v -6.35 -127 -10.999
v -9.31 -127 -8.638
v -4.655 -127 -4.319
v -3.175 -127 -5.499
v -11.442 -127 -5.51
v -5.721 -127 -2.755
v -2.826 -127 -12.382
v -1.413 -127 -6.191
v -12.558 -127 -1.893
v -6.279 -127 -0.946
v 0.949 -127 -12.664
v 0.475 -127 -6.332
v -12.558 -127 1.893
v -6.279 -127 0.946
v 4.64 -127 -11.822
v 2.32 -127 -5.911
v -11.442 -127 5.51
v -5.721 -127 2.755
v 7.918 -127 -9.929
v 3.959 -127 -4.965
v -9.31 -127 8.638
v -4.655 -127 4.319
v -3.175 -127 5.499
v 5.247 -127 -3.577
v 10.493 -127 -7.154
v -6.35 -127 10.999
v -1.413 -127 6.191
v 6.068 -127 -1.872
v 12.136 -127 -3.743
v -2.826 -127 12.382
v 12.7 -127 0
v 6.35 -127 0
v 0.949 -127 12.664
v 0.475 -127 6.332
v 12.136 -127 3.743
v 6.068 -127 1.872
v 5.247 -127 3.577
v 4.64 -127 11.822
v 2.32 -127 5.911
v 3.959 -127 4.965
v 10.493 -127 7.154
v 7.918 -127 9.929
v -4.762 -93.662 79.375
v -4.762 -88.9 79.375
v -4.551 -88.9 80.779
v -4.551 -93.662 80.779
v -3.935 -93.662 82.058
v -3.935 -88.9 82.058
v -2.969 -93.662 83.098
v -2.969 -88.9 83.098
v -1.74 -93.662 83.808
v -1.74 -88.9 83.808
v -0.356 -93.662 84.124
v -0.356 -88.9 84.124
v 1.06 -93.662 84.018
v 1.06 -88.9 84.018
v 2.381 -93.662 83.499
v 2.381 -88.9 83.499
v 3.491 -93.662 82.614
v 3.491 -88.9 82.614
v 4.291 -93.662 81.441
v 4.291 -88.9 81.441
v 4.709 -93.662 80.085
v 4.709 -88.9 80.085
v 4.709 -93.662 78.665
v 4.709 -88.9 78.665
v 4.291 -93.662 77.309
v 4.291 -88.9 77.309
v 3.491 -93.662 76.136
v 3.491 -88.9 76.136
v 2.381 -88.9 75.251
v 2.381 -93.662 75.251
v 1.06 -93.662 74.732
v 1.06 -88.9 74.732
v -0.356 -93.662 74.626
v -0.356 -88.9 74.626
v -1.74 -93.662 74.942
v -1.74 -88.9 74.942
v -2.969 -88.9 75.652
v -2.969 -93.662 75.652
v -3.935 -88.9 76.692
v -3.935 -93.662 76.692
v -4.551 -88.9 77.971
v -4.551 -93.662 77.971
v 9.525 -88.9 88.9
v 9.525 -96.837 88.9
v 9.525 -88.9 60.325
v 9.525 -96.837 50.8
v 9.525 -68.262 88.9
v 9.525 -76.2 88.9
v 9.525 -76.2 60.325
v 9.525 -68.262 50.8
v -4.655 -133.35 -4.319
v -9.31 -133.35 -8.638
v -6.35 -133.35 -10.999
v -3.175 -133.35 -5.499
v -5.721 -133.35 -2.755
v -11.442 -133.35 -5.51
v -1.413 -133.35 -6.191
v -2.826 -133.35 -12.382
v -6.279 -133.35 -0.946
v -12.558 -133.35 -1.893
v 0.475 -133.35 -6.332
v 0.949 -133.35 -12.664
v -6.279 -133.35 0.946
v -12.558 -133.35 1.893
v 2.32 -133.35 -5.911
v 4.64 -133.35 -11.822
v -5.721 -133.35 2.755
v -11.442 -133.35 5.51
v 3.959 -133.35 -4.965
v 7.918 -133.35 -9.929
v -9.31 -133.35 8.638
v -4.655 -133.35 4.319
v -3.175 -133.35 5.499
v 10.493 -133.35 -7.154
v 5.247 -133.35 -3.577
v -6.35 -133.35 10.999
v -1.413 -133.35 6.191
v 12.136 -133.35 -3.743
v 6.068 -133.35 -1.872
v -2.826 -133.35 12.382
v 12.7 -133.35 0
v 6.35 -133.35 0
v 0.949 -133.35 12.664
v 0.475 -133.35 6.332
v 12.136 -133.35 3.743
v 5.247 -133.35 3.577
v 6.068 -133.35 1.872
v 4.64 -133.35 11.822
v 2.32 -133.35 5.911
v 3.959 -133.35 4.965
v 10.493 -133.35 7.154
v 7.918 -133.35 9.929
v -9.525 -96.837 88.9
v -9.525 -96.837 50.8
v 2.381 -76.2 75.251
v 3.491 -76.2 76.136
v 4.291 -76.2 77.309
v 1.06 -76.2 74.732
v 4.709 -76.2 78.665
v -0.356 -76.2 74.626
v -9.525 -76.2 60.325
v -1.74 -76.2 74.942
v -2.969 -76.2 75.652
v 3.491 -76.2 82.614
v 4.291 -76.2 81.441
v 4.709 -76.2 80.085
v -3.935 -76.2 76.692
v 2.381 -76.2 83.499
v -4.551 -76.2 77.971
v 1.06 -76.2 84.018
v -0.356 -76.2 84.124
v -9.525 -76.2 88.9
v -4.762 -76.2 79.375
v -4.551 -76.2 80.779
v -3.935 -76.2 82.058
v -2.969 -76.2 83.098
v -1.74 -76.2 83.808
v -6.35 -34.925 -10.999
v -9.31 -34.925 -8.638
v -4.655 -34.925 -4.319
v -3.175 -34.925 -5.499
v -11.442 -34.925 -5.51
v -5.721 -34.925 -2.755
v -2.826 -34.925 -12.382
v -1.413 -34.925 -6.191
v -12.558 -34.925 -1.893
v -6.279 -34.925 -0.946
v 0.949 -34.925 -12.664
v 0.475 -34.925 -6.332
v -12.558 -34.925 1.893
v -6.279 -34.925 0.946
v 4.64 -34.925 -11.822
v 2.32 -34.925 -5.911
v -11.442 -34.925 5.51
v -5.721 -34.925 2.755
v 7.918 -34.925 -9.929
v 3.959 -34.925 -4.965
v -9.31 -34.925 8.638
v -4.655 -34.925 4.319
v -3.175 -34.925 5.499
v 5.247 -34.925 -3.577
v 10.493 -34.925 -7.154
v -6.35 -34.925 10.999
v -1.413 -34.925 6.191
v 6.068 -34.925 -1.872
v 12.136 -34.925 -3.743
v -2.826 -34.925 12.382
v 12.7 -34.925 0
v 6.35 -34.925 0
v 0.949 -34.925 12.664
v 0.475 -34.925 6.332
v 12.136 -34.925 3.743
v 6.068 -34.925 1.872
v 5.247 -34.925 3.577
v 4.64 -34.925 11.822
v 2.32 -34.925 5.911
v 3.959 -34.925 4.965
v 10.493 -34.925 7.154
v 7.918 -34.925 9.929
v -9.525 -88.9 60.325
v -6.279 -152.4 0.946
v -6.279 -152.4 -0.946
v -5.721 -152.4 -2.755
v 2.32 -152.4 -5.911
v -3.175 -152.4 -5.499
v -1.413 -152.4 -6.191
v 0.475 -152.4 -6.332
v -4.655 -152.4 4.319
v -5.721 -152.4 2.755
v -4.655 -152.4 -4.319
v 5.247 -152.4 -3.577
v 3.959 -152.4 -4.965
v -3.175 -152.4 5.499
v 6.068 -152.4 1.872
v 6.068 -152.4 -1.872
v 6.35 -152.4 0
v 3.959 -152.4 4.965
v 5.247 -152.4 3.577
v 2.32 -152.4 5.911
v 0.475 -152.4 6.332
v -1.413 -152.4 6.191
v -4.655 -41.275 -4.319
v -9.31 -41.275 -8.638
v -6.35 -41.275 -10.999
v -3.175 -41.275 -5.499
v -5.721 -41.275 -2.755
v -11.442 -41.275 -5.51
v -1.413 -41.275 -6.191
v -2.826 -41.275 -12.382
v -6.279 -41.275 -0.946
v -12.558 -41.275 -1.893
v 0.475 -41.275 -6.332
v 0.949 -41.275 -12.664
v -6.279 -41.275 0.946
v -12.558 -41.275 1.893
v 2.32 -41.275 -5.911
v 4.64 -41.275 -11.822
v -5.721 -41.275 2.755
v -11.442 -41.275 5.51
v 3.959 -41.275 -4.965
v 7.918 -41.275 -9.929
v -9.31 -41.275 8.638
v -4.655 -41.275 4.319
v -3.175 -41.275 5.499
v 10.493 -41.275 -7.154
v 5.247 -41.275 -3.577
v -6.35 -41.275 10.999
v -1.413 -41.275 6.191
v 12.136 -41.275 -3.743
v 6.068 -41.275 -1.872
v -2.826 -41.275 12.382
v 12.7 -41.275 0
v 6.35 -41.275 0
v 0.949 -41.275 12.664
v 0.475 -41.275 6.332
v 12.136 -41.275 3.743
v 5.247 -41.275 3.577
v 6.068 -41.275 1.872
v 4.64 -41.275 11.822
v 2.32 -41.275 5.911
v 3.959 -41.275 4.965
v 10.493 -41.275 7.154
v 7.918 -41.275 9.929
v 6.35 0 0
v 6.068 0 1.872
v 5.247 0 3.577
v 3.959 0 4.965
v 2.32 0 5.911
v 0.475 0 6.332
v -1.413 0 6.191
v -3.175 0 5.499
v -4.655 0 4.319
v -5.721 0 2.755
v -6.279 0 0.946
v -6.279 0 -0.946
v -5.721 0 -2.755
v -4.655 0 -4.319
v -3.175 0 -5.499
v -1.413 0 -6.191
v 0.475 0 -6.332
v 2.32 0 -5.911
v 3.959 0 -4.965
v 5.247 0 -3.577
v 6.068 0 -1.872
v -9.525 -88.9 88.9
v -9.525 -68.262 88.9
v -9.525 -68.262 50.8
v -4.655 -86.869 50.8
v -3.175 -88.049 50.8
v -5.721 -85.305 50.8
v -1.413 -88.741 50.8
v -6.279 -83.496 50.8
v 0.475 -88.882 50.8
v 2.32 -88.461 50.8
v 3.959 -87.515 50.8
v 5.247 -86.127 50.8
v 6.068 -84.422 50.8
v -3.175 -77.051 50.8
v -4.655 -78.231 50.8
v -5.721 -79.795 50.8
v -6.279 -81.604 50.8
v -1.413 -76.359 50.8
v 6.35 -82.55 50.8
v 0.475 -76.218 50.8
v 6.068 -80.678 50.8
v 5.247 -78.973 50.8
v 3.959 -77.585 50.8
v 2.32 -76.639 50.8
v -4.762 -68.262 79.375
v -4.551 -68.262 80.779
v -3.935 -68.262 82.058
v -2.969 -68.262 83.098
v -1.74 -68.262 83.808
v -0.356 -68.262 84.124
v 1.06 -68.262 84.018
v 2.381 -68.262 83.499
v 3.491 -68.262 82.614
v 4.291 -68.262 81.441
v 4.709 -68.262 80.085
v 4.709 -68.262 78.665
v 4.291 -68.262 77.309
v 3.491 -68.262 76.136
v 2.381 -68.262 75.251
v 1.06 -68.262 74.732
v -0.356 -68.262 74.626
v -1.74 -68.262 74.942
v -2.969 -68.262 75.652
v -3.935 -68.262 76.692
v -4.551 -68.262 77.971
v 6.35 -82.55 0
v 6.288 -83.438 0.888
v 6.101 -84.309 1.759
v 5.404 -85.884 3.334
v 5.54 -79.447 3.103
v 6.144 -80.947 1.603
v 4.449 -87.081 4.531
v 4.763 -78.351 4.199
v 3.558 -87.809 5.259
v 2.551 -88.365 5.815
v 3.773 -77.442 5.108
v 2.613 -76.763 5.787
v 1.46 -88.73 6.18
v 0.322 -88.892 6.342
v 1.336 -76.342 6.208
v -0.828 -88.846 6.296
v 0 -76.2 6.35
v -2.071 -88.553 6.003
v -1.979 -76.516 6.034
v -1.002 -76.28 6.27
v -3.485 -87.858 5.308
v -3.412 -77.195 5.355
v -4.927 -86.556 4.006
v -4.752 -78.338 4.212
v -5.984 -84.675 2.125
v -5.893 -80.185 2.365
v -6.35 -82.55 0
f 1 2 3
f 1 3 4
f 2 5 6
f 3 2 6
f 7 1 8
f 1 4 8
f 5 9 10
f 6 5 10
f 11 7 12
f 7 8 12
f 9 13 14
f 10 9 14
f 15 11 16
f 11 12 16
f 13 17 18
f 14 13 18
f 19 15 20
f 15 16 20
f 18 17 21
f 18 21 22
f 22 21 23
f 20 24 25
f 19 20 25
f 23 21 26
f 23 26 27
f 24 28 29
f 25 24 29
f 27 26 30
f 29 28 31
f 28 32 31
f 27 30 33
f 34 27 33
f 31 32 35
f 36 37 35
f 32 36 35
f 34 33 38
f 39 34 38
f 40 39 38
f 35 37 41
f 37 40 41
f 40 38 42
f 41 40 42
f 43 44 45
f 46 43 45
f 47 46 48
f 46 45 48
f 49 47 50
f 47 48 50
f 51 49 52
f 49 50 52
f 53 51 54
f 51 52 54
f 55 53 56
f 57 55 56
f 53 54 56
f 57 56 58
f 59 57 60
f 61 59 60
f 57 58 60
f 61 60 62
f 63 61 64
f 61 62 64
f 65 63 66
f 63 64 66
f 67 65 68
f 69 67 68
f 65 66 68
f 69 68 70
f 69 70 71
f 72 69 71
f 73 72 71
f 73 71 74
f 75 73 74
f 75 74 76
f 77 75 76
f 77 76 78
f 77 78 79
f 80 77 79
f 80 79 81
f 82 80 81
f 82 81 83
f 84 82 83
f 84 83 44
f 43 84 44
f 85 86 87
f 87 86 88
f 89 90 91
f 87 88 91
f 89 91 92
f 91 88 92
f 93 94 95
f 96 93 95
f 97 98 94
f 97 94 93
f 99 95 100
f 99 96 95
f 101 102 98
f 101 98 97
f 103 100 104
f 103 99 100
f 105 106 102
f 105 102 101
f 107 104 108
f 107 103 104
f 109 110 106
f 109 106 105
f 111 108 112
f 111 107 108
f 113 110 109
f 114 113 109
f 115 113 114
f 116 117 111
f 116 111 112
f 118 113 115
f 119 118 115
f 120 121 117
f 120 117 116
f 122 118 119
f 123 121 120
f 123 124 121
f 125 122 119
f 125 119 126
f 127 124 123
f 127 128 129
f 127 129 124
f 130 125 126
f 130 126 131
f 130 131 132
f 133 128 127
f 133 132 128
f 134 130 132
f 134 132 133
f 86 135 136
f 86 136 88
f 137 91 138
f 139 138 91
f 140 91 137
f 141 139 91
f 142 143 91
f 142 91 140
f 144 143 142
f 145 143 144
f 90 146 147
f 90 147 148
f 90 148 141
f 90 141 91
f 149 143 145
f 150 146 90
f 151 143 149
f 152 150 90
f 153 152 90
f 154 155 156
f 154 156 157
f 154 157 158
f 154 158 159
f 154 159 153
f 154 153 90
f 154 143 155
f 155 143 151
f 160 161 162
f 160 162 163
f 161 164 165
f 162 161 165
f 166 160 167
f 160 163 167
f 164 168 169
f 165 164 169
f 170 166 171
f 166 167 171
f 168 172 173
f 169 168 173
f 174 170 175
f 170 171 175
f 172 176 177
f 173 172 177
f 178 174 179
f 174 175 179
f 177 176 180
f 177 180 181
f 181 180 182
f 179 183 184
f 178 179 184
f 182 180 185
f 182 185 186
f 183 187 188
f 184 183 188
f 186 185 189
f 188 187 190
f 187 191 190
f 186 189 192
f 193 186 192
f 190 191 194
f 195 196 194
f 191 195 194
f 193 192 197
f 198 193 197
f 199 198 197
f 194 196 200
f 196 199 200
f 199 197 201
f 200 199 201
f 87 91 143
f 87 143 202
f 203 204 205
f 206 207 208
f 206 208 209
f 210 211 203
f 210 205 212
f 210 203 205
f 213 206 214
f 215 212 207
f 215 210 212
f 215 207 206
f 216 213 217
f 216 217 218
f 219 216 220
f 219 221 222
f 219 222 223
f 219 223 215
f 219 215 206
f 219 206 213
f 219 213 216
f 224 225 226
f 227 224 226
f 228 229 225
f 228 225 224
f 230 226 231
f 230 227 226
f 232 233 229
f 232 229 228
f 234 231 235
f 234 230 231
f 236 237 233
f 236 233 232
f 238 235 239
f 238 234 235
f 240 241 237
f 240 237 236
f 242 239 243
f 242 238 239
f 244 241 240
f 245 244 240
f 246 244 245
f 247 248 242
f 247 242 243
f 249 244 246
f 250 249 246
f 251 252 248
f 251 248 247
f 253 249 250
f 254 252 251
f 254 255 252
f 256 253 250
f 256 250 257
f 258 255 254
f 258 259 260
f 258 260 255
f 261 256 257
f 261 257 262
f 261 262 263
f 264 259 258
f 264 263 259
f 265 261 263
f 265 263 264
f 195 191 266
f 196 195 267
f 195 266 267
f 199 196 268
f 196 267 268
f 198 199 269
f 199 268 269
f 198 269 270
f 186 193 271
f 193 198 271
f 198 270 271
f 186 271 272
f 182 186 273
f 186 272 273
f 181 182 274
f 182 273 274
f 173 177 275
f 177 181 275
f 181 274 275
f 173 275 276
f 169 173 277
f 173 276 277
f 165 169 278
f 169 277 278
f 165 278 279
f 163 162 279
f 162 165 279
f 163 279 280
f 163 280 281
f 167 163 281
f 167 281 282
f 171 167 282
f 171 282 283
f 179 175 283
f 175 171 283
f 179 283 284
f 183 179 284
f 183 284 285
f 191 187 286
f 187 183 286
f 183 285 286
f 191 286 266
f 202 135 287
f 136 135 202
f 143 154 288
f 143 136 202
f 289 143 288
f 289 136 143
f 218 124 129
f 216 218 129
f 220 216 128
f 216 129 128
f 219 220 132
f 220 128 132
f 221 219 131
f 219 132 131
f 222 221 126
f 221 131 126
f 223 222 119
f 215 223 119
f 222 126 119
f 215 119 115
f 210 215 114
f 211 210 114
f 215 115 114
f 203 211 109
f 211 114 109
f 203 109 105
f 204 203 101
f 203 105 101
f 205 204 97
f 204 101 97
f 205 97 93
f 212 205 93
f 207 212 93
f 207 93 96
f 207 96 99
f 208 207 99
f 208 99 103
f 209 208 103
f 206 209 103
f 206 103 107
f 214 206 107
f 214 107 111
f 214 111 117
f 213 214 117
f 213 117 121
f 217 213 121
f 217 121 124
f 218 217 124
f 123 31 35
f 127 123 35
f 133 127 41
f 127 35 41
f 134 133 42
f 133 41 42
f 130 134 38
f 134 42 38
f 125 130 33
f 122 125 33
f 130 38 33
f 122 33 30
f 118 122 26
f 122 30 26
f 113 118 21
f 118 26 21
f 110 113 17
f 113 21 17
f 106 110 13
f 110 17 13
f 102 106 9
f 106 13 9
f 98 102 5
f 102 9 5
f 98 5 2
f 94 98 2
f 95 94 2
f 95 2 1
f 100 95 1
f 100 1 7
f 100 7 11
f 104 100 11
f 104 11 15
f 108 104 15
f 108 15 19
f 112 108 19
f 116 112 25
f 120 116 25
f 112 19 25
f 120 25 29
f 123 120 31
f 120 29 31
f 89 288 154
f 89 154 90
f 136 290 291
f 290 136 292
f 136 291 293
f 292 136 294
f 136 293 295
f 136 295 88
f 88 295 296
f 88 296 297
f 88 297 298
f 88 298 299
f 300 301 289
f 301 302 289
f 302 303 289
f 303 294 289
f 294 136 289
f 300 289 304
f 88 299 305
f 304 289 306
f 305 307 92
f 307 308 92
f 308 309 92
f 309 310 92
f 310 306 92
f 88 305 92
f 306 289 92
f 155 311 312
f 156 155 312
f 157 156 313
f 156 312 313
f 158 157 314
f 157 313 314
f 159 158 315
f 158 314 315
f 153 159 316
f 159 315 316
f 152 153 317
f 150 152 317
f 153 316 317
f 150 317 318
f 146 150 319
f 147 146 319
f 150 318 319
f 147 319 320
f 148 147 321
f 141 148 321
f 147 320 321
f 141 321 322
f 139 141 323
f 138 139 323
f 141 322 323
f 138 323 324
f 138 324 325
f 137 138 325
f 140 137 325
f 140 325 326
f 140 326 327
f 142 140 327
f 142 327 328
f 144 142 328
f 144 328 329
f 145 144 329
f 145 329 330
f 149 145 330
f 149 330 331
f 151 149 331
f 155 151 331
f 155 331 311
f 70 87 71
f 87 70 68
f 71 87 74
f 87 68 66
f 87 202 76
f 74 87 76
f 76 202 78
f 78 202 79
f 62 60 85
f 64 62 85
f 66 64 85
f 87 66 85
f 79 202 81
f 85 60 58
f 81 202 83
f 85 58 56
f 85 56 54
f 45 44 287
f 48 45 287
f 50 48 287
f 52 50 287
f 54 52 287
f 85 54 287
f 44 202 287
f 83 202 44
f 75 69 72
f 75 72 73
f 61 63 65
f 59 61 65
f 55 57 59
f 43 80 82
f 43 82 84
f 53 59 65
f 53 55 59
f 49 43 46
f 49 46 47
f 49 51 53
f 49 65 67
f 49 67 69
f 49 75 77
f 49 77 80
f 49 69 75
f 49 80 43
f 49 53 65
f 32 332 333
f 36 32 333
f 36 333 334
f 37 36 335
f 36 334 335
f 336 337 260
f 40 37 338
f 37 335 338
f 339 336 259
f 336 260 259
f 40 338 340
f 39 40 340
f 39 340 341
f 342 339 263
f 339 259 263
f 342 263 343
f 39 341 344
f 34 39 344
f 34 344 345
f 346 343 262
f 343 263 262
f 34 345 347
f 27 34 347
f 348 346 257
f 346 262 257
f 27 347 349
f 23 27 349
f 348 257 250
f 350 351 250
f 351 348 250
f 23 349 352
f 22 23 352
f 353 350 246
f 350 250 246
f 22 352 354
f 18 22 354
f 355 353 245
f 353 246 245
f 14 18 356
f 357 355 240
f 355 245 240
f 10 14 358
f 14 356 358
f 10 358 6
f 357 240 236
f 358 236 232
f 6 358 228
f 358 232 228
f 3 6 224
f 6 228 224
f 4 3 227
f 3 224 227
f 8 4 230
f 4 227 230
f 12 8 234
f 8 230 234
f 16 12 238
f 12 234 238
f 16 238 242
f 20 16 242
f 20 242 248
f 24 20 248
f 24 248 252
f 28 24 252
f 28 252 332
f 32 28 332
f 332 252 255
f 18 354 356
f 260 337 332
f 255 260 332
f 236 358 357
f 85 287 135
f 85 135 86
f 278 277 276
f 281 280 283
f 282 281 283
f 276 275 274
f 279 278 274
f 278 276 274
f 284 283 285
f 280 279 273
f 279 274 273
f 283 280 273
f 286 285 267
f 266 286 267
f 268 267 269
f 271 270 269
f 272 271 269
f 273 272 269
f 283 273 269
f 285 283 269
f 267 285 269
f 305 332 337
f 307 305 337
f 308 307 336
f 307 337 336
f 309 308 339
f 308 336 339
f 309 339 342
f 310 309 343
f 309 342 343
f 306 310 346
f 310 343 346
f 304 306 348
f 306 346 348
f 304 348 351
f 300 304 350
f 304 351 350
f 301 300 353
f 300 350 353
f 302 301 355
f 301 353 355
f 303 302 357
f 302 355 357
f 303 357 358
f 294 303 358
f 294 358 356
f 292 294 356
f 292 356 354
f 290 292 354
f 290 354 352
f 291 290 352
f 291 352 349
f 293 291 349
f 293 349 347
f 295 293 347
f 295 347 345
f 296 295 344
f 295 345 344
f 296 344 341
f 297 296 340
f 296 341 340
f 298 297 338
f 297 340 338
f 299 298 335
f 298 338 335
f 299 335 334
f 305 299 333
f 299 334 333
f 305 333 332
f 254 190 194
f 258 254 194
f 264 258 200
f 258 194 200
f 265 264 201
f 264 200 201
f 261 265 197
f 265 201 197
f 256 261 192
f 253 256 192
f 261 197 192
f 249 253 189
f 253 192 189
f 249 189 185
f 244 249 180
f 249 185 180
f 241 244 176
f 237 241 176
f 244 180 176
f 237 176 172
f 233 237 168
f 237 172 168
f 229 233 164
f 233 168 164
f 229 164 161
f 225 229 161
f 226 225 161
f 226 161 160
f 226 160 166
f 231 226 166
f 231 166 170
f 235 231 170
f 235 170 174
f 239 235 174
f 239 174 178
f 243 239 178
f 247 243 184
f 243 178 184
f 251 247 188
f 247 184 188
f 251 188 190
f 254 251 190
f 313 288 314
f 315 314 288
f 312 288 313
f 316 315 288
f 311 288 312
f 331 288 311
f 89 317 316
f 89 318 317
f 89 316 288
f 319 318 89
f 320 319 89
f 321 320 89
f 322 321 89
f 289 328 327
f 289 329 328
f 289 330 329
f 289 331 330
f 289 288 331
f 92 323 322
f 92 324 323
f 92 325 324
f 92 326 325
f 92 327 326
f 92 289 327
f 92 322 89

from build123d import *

# Parameters (mm, degrees)
F0_R      = 6.35
F1_DEPTH  = 152.4
F4_R      = 12.7
F5_DEPTH  = 6.35
F6_R      = 12.7
F7_DEPTH  = 6.35
F9_R      = 6.35
F10_DEPTH = 50.8
F11_W     = 19.05
F11_H     = 28.575
F12_DEPTH = 38.1
F13_W     = 12.7
F13_H     = 28.575
F14_DEPTH = 25.4
F15_R     = 4.7625
F16_DEPTH = 25.4


with BuildPart() as f1:
    # F0 (on Front) → F1 (new body)
    with BuildSketch(Plane.XZ):
        Circle(F0_R)
    extrude(amount=F1_DEPTH)

    # F4 (on offset) → F5 (join)
    with BuildSketch(Plane.XZ.offset(127)):
        Circle(F4_R)
    extrude(amount=F5_DEPTH)

    # F6 (on offset) → F7 (join)
    with BuildSketch(Plane.XZ.offset(34.925)):
        Circle(F6_R)
    extrude(amount=F7_DEPTH)

    # F9 (on offset) → F10 (join)
    with BuildSketch(Plane.XY):
        with Locations((0, -82.55)):
            Circle(F9_R)
    extrude(amount=F10_DEPTH)

    # F11 (on face) → F12 (join)
    with BuildSketch(Plane.XY.offset(50.8)):
        with Locations((0, -82.55)):
            Rectangle(F11_W, F11_H)
    extrude(amount=F12_DEPTH)

    # F13 (on face) → F14 (cut)
    with BuildSketch(Plane(origin=(-9.525, 0, 0), x_dir=(0, -1, 0), z_dir=(-1, 0, 0))):
        with Locations((82.55, 74.6125)):
            Rectangle(F13_W, F13_H)
    extrude(amount=-F14_DEPTH, mode=Mode.SUBTRACT)

    # F15 (on face) → F16 (cut)
    with BuildSketch(Plane(origin=(0, -68.2625, 0), x_dir=(-1, 0, 0), z_dir=(0, 1, 0))):
        with Locations((0, 79.375)):
            Circle(F15_R)
    extrude(amount=-F16_DEPTH, mode=Mode.SUBTRACT)


solid = f1.part
